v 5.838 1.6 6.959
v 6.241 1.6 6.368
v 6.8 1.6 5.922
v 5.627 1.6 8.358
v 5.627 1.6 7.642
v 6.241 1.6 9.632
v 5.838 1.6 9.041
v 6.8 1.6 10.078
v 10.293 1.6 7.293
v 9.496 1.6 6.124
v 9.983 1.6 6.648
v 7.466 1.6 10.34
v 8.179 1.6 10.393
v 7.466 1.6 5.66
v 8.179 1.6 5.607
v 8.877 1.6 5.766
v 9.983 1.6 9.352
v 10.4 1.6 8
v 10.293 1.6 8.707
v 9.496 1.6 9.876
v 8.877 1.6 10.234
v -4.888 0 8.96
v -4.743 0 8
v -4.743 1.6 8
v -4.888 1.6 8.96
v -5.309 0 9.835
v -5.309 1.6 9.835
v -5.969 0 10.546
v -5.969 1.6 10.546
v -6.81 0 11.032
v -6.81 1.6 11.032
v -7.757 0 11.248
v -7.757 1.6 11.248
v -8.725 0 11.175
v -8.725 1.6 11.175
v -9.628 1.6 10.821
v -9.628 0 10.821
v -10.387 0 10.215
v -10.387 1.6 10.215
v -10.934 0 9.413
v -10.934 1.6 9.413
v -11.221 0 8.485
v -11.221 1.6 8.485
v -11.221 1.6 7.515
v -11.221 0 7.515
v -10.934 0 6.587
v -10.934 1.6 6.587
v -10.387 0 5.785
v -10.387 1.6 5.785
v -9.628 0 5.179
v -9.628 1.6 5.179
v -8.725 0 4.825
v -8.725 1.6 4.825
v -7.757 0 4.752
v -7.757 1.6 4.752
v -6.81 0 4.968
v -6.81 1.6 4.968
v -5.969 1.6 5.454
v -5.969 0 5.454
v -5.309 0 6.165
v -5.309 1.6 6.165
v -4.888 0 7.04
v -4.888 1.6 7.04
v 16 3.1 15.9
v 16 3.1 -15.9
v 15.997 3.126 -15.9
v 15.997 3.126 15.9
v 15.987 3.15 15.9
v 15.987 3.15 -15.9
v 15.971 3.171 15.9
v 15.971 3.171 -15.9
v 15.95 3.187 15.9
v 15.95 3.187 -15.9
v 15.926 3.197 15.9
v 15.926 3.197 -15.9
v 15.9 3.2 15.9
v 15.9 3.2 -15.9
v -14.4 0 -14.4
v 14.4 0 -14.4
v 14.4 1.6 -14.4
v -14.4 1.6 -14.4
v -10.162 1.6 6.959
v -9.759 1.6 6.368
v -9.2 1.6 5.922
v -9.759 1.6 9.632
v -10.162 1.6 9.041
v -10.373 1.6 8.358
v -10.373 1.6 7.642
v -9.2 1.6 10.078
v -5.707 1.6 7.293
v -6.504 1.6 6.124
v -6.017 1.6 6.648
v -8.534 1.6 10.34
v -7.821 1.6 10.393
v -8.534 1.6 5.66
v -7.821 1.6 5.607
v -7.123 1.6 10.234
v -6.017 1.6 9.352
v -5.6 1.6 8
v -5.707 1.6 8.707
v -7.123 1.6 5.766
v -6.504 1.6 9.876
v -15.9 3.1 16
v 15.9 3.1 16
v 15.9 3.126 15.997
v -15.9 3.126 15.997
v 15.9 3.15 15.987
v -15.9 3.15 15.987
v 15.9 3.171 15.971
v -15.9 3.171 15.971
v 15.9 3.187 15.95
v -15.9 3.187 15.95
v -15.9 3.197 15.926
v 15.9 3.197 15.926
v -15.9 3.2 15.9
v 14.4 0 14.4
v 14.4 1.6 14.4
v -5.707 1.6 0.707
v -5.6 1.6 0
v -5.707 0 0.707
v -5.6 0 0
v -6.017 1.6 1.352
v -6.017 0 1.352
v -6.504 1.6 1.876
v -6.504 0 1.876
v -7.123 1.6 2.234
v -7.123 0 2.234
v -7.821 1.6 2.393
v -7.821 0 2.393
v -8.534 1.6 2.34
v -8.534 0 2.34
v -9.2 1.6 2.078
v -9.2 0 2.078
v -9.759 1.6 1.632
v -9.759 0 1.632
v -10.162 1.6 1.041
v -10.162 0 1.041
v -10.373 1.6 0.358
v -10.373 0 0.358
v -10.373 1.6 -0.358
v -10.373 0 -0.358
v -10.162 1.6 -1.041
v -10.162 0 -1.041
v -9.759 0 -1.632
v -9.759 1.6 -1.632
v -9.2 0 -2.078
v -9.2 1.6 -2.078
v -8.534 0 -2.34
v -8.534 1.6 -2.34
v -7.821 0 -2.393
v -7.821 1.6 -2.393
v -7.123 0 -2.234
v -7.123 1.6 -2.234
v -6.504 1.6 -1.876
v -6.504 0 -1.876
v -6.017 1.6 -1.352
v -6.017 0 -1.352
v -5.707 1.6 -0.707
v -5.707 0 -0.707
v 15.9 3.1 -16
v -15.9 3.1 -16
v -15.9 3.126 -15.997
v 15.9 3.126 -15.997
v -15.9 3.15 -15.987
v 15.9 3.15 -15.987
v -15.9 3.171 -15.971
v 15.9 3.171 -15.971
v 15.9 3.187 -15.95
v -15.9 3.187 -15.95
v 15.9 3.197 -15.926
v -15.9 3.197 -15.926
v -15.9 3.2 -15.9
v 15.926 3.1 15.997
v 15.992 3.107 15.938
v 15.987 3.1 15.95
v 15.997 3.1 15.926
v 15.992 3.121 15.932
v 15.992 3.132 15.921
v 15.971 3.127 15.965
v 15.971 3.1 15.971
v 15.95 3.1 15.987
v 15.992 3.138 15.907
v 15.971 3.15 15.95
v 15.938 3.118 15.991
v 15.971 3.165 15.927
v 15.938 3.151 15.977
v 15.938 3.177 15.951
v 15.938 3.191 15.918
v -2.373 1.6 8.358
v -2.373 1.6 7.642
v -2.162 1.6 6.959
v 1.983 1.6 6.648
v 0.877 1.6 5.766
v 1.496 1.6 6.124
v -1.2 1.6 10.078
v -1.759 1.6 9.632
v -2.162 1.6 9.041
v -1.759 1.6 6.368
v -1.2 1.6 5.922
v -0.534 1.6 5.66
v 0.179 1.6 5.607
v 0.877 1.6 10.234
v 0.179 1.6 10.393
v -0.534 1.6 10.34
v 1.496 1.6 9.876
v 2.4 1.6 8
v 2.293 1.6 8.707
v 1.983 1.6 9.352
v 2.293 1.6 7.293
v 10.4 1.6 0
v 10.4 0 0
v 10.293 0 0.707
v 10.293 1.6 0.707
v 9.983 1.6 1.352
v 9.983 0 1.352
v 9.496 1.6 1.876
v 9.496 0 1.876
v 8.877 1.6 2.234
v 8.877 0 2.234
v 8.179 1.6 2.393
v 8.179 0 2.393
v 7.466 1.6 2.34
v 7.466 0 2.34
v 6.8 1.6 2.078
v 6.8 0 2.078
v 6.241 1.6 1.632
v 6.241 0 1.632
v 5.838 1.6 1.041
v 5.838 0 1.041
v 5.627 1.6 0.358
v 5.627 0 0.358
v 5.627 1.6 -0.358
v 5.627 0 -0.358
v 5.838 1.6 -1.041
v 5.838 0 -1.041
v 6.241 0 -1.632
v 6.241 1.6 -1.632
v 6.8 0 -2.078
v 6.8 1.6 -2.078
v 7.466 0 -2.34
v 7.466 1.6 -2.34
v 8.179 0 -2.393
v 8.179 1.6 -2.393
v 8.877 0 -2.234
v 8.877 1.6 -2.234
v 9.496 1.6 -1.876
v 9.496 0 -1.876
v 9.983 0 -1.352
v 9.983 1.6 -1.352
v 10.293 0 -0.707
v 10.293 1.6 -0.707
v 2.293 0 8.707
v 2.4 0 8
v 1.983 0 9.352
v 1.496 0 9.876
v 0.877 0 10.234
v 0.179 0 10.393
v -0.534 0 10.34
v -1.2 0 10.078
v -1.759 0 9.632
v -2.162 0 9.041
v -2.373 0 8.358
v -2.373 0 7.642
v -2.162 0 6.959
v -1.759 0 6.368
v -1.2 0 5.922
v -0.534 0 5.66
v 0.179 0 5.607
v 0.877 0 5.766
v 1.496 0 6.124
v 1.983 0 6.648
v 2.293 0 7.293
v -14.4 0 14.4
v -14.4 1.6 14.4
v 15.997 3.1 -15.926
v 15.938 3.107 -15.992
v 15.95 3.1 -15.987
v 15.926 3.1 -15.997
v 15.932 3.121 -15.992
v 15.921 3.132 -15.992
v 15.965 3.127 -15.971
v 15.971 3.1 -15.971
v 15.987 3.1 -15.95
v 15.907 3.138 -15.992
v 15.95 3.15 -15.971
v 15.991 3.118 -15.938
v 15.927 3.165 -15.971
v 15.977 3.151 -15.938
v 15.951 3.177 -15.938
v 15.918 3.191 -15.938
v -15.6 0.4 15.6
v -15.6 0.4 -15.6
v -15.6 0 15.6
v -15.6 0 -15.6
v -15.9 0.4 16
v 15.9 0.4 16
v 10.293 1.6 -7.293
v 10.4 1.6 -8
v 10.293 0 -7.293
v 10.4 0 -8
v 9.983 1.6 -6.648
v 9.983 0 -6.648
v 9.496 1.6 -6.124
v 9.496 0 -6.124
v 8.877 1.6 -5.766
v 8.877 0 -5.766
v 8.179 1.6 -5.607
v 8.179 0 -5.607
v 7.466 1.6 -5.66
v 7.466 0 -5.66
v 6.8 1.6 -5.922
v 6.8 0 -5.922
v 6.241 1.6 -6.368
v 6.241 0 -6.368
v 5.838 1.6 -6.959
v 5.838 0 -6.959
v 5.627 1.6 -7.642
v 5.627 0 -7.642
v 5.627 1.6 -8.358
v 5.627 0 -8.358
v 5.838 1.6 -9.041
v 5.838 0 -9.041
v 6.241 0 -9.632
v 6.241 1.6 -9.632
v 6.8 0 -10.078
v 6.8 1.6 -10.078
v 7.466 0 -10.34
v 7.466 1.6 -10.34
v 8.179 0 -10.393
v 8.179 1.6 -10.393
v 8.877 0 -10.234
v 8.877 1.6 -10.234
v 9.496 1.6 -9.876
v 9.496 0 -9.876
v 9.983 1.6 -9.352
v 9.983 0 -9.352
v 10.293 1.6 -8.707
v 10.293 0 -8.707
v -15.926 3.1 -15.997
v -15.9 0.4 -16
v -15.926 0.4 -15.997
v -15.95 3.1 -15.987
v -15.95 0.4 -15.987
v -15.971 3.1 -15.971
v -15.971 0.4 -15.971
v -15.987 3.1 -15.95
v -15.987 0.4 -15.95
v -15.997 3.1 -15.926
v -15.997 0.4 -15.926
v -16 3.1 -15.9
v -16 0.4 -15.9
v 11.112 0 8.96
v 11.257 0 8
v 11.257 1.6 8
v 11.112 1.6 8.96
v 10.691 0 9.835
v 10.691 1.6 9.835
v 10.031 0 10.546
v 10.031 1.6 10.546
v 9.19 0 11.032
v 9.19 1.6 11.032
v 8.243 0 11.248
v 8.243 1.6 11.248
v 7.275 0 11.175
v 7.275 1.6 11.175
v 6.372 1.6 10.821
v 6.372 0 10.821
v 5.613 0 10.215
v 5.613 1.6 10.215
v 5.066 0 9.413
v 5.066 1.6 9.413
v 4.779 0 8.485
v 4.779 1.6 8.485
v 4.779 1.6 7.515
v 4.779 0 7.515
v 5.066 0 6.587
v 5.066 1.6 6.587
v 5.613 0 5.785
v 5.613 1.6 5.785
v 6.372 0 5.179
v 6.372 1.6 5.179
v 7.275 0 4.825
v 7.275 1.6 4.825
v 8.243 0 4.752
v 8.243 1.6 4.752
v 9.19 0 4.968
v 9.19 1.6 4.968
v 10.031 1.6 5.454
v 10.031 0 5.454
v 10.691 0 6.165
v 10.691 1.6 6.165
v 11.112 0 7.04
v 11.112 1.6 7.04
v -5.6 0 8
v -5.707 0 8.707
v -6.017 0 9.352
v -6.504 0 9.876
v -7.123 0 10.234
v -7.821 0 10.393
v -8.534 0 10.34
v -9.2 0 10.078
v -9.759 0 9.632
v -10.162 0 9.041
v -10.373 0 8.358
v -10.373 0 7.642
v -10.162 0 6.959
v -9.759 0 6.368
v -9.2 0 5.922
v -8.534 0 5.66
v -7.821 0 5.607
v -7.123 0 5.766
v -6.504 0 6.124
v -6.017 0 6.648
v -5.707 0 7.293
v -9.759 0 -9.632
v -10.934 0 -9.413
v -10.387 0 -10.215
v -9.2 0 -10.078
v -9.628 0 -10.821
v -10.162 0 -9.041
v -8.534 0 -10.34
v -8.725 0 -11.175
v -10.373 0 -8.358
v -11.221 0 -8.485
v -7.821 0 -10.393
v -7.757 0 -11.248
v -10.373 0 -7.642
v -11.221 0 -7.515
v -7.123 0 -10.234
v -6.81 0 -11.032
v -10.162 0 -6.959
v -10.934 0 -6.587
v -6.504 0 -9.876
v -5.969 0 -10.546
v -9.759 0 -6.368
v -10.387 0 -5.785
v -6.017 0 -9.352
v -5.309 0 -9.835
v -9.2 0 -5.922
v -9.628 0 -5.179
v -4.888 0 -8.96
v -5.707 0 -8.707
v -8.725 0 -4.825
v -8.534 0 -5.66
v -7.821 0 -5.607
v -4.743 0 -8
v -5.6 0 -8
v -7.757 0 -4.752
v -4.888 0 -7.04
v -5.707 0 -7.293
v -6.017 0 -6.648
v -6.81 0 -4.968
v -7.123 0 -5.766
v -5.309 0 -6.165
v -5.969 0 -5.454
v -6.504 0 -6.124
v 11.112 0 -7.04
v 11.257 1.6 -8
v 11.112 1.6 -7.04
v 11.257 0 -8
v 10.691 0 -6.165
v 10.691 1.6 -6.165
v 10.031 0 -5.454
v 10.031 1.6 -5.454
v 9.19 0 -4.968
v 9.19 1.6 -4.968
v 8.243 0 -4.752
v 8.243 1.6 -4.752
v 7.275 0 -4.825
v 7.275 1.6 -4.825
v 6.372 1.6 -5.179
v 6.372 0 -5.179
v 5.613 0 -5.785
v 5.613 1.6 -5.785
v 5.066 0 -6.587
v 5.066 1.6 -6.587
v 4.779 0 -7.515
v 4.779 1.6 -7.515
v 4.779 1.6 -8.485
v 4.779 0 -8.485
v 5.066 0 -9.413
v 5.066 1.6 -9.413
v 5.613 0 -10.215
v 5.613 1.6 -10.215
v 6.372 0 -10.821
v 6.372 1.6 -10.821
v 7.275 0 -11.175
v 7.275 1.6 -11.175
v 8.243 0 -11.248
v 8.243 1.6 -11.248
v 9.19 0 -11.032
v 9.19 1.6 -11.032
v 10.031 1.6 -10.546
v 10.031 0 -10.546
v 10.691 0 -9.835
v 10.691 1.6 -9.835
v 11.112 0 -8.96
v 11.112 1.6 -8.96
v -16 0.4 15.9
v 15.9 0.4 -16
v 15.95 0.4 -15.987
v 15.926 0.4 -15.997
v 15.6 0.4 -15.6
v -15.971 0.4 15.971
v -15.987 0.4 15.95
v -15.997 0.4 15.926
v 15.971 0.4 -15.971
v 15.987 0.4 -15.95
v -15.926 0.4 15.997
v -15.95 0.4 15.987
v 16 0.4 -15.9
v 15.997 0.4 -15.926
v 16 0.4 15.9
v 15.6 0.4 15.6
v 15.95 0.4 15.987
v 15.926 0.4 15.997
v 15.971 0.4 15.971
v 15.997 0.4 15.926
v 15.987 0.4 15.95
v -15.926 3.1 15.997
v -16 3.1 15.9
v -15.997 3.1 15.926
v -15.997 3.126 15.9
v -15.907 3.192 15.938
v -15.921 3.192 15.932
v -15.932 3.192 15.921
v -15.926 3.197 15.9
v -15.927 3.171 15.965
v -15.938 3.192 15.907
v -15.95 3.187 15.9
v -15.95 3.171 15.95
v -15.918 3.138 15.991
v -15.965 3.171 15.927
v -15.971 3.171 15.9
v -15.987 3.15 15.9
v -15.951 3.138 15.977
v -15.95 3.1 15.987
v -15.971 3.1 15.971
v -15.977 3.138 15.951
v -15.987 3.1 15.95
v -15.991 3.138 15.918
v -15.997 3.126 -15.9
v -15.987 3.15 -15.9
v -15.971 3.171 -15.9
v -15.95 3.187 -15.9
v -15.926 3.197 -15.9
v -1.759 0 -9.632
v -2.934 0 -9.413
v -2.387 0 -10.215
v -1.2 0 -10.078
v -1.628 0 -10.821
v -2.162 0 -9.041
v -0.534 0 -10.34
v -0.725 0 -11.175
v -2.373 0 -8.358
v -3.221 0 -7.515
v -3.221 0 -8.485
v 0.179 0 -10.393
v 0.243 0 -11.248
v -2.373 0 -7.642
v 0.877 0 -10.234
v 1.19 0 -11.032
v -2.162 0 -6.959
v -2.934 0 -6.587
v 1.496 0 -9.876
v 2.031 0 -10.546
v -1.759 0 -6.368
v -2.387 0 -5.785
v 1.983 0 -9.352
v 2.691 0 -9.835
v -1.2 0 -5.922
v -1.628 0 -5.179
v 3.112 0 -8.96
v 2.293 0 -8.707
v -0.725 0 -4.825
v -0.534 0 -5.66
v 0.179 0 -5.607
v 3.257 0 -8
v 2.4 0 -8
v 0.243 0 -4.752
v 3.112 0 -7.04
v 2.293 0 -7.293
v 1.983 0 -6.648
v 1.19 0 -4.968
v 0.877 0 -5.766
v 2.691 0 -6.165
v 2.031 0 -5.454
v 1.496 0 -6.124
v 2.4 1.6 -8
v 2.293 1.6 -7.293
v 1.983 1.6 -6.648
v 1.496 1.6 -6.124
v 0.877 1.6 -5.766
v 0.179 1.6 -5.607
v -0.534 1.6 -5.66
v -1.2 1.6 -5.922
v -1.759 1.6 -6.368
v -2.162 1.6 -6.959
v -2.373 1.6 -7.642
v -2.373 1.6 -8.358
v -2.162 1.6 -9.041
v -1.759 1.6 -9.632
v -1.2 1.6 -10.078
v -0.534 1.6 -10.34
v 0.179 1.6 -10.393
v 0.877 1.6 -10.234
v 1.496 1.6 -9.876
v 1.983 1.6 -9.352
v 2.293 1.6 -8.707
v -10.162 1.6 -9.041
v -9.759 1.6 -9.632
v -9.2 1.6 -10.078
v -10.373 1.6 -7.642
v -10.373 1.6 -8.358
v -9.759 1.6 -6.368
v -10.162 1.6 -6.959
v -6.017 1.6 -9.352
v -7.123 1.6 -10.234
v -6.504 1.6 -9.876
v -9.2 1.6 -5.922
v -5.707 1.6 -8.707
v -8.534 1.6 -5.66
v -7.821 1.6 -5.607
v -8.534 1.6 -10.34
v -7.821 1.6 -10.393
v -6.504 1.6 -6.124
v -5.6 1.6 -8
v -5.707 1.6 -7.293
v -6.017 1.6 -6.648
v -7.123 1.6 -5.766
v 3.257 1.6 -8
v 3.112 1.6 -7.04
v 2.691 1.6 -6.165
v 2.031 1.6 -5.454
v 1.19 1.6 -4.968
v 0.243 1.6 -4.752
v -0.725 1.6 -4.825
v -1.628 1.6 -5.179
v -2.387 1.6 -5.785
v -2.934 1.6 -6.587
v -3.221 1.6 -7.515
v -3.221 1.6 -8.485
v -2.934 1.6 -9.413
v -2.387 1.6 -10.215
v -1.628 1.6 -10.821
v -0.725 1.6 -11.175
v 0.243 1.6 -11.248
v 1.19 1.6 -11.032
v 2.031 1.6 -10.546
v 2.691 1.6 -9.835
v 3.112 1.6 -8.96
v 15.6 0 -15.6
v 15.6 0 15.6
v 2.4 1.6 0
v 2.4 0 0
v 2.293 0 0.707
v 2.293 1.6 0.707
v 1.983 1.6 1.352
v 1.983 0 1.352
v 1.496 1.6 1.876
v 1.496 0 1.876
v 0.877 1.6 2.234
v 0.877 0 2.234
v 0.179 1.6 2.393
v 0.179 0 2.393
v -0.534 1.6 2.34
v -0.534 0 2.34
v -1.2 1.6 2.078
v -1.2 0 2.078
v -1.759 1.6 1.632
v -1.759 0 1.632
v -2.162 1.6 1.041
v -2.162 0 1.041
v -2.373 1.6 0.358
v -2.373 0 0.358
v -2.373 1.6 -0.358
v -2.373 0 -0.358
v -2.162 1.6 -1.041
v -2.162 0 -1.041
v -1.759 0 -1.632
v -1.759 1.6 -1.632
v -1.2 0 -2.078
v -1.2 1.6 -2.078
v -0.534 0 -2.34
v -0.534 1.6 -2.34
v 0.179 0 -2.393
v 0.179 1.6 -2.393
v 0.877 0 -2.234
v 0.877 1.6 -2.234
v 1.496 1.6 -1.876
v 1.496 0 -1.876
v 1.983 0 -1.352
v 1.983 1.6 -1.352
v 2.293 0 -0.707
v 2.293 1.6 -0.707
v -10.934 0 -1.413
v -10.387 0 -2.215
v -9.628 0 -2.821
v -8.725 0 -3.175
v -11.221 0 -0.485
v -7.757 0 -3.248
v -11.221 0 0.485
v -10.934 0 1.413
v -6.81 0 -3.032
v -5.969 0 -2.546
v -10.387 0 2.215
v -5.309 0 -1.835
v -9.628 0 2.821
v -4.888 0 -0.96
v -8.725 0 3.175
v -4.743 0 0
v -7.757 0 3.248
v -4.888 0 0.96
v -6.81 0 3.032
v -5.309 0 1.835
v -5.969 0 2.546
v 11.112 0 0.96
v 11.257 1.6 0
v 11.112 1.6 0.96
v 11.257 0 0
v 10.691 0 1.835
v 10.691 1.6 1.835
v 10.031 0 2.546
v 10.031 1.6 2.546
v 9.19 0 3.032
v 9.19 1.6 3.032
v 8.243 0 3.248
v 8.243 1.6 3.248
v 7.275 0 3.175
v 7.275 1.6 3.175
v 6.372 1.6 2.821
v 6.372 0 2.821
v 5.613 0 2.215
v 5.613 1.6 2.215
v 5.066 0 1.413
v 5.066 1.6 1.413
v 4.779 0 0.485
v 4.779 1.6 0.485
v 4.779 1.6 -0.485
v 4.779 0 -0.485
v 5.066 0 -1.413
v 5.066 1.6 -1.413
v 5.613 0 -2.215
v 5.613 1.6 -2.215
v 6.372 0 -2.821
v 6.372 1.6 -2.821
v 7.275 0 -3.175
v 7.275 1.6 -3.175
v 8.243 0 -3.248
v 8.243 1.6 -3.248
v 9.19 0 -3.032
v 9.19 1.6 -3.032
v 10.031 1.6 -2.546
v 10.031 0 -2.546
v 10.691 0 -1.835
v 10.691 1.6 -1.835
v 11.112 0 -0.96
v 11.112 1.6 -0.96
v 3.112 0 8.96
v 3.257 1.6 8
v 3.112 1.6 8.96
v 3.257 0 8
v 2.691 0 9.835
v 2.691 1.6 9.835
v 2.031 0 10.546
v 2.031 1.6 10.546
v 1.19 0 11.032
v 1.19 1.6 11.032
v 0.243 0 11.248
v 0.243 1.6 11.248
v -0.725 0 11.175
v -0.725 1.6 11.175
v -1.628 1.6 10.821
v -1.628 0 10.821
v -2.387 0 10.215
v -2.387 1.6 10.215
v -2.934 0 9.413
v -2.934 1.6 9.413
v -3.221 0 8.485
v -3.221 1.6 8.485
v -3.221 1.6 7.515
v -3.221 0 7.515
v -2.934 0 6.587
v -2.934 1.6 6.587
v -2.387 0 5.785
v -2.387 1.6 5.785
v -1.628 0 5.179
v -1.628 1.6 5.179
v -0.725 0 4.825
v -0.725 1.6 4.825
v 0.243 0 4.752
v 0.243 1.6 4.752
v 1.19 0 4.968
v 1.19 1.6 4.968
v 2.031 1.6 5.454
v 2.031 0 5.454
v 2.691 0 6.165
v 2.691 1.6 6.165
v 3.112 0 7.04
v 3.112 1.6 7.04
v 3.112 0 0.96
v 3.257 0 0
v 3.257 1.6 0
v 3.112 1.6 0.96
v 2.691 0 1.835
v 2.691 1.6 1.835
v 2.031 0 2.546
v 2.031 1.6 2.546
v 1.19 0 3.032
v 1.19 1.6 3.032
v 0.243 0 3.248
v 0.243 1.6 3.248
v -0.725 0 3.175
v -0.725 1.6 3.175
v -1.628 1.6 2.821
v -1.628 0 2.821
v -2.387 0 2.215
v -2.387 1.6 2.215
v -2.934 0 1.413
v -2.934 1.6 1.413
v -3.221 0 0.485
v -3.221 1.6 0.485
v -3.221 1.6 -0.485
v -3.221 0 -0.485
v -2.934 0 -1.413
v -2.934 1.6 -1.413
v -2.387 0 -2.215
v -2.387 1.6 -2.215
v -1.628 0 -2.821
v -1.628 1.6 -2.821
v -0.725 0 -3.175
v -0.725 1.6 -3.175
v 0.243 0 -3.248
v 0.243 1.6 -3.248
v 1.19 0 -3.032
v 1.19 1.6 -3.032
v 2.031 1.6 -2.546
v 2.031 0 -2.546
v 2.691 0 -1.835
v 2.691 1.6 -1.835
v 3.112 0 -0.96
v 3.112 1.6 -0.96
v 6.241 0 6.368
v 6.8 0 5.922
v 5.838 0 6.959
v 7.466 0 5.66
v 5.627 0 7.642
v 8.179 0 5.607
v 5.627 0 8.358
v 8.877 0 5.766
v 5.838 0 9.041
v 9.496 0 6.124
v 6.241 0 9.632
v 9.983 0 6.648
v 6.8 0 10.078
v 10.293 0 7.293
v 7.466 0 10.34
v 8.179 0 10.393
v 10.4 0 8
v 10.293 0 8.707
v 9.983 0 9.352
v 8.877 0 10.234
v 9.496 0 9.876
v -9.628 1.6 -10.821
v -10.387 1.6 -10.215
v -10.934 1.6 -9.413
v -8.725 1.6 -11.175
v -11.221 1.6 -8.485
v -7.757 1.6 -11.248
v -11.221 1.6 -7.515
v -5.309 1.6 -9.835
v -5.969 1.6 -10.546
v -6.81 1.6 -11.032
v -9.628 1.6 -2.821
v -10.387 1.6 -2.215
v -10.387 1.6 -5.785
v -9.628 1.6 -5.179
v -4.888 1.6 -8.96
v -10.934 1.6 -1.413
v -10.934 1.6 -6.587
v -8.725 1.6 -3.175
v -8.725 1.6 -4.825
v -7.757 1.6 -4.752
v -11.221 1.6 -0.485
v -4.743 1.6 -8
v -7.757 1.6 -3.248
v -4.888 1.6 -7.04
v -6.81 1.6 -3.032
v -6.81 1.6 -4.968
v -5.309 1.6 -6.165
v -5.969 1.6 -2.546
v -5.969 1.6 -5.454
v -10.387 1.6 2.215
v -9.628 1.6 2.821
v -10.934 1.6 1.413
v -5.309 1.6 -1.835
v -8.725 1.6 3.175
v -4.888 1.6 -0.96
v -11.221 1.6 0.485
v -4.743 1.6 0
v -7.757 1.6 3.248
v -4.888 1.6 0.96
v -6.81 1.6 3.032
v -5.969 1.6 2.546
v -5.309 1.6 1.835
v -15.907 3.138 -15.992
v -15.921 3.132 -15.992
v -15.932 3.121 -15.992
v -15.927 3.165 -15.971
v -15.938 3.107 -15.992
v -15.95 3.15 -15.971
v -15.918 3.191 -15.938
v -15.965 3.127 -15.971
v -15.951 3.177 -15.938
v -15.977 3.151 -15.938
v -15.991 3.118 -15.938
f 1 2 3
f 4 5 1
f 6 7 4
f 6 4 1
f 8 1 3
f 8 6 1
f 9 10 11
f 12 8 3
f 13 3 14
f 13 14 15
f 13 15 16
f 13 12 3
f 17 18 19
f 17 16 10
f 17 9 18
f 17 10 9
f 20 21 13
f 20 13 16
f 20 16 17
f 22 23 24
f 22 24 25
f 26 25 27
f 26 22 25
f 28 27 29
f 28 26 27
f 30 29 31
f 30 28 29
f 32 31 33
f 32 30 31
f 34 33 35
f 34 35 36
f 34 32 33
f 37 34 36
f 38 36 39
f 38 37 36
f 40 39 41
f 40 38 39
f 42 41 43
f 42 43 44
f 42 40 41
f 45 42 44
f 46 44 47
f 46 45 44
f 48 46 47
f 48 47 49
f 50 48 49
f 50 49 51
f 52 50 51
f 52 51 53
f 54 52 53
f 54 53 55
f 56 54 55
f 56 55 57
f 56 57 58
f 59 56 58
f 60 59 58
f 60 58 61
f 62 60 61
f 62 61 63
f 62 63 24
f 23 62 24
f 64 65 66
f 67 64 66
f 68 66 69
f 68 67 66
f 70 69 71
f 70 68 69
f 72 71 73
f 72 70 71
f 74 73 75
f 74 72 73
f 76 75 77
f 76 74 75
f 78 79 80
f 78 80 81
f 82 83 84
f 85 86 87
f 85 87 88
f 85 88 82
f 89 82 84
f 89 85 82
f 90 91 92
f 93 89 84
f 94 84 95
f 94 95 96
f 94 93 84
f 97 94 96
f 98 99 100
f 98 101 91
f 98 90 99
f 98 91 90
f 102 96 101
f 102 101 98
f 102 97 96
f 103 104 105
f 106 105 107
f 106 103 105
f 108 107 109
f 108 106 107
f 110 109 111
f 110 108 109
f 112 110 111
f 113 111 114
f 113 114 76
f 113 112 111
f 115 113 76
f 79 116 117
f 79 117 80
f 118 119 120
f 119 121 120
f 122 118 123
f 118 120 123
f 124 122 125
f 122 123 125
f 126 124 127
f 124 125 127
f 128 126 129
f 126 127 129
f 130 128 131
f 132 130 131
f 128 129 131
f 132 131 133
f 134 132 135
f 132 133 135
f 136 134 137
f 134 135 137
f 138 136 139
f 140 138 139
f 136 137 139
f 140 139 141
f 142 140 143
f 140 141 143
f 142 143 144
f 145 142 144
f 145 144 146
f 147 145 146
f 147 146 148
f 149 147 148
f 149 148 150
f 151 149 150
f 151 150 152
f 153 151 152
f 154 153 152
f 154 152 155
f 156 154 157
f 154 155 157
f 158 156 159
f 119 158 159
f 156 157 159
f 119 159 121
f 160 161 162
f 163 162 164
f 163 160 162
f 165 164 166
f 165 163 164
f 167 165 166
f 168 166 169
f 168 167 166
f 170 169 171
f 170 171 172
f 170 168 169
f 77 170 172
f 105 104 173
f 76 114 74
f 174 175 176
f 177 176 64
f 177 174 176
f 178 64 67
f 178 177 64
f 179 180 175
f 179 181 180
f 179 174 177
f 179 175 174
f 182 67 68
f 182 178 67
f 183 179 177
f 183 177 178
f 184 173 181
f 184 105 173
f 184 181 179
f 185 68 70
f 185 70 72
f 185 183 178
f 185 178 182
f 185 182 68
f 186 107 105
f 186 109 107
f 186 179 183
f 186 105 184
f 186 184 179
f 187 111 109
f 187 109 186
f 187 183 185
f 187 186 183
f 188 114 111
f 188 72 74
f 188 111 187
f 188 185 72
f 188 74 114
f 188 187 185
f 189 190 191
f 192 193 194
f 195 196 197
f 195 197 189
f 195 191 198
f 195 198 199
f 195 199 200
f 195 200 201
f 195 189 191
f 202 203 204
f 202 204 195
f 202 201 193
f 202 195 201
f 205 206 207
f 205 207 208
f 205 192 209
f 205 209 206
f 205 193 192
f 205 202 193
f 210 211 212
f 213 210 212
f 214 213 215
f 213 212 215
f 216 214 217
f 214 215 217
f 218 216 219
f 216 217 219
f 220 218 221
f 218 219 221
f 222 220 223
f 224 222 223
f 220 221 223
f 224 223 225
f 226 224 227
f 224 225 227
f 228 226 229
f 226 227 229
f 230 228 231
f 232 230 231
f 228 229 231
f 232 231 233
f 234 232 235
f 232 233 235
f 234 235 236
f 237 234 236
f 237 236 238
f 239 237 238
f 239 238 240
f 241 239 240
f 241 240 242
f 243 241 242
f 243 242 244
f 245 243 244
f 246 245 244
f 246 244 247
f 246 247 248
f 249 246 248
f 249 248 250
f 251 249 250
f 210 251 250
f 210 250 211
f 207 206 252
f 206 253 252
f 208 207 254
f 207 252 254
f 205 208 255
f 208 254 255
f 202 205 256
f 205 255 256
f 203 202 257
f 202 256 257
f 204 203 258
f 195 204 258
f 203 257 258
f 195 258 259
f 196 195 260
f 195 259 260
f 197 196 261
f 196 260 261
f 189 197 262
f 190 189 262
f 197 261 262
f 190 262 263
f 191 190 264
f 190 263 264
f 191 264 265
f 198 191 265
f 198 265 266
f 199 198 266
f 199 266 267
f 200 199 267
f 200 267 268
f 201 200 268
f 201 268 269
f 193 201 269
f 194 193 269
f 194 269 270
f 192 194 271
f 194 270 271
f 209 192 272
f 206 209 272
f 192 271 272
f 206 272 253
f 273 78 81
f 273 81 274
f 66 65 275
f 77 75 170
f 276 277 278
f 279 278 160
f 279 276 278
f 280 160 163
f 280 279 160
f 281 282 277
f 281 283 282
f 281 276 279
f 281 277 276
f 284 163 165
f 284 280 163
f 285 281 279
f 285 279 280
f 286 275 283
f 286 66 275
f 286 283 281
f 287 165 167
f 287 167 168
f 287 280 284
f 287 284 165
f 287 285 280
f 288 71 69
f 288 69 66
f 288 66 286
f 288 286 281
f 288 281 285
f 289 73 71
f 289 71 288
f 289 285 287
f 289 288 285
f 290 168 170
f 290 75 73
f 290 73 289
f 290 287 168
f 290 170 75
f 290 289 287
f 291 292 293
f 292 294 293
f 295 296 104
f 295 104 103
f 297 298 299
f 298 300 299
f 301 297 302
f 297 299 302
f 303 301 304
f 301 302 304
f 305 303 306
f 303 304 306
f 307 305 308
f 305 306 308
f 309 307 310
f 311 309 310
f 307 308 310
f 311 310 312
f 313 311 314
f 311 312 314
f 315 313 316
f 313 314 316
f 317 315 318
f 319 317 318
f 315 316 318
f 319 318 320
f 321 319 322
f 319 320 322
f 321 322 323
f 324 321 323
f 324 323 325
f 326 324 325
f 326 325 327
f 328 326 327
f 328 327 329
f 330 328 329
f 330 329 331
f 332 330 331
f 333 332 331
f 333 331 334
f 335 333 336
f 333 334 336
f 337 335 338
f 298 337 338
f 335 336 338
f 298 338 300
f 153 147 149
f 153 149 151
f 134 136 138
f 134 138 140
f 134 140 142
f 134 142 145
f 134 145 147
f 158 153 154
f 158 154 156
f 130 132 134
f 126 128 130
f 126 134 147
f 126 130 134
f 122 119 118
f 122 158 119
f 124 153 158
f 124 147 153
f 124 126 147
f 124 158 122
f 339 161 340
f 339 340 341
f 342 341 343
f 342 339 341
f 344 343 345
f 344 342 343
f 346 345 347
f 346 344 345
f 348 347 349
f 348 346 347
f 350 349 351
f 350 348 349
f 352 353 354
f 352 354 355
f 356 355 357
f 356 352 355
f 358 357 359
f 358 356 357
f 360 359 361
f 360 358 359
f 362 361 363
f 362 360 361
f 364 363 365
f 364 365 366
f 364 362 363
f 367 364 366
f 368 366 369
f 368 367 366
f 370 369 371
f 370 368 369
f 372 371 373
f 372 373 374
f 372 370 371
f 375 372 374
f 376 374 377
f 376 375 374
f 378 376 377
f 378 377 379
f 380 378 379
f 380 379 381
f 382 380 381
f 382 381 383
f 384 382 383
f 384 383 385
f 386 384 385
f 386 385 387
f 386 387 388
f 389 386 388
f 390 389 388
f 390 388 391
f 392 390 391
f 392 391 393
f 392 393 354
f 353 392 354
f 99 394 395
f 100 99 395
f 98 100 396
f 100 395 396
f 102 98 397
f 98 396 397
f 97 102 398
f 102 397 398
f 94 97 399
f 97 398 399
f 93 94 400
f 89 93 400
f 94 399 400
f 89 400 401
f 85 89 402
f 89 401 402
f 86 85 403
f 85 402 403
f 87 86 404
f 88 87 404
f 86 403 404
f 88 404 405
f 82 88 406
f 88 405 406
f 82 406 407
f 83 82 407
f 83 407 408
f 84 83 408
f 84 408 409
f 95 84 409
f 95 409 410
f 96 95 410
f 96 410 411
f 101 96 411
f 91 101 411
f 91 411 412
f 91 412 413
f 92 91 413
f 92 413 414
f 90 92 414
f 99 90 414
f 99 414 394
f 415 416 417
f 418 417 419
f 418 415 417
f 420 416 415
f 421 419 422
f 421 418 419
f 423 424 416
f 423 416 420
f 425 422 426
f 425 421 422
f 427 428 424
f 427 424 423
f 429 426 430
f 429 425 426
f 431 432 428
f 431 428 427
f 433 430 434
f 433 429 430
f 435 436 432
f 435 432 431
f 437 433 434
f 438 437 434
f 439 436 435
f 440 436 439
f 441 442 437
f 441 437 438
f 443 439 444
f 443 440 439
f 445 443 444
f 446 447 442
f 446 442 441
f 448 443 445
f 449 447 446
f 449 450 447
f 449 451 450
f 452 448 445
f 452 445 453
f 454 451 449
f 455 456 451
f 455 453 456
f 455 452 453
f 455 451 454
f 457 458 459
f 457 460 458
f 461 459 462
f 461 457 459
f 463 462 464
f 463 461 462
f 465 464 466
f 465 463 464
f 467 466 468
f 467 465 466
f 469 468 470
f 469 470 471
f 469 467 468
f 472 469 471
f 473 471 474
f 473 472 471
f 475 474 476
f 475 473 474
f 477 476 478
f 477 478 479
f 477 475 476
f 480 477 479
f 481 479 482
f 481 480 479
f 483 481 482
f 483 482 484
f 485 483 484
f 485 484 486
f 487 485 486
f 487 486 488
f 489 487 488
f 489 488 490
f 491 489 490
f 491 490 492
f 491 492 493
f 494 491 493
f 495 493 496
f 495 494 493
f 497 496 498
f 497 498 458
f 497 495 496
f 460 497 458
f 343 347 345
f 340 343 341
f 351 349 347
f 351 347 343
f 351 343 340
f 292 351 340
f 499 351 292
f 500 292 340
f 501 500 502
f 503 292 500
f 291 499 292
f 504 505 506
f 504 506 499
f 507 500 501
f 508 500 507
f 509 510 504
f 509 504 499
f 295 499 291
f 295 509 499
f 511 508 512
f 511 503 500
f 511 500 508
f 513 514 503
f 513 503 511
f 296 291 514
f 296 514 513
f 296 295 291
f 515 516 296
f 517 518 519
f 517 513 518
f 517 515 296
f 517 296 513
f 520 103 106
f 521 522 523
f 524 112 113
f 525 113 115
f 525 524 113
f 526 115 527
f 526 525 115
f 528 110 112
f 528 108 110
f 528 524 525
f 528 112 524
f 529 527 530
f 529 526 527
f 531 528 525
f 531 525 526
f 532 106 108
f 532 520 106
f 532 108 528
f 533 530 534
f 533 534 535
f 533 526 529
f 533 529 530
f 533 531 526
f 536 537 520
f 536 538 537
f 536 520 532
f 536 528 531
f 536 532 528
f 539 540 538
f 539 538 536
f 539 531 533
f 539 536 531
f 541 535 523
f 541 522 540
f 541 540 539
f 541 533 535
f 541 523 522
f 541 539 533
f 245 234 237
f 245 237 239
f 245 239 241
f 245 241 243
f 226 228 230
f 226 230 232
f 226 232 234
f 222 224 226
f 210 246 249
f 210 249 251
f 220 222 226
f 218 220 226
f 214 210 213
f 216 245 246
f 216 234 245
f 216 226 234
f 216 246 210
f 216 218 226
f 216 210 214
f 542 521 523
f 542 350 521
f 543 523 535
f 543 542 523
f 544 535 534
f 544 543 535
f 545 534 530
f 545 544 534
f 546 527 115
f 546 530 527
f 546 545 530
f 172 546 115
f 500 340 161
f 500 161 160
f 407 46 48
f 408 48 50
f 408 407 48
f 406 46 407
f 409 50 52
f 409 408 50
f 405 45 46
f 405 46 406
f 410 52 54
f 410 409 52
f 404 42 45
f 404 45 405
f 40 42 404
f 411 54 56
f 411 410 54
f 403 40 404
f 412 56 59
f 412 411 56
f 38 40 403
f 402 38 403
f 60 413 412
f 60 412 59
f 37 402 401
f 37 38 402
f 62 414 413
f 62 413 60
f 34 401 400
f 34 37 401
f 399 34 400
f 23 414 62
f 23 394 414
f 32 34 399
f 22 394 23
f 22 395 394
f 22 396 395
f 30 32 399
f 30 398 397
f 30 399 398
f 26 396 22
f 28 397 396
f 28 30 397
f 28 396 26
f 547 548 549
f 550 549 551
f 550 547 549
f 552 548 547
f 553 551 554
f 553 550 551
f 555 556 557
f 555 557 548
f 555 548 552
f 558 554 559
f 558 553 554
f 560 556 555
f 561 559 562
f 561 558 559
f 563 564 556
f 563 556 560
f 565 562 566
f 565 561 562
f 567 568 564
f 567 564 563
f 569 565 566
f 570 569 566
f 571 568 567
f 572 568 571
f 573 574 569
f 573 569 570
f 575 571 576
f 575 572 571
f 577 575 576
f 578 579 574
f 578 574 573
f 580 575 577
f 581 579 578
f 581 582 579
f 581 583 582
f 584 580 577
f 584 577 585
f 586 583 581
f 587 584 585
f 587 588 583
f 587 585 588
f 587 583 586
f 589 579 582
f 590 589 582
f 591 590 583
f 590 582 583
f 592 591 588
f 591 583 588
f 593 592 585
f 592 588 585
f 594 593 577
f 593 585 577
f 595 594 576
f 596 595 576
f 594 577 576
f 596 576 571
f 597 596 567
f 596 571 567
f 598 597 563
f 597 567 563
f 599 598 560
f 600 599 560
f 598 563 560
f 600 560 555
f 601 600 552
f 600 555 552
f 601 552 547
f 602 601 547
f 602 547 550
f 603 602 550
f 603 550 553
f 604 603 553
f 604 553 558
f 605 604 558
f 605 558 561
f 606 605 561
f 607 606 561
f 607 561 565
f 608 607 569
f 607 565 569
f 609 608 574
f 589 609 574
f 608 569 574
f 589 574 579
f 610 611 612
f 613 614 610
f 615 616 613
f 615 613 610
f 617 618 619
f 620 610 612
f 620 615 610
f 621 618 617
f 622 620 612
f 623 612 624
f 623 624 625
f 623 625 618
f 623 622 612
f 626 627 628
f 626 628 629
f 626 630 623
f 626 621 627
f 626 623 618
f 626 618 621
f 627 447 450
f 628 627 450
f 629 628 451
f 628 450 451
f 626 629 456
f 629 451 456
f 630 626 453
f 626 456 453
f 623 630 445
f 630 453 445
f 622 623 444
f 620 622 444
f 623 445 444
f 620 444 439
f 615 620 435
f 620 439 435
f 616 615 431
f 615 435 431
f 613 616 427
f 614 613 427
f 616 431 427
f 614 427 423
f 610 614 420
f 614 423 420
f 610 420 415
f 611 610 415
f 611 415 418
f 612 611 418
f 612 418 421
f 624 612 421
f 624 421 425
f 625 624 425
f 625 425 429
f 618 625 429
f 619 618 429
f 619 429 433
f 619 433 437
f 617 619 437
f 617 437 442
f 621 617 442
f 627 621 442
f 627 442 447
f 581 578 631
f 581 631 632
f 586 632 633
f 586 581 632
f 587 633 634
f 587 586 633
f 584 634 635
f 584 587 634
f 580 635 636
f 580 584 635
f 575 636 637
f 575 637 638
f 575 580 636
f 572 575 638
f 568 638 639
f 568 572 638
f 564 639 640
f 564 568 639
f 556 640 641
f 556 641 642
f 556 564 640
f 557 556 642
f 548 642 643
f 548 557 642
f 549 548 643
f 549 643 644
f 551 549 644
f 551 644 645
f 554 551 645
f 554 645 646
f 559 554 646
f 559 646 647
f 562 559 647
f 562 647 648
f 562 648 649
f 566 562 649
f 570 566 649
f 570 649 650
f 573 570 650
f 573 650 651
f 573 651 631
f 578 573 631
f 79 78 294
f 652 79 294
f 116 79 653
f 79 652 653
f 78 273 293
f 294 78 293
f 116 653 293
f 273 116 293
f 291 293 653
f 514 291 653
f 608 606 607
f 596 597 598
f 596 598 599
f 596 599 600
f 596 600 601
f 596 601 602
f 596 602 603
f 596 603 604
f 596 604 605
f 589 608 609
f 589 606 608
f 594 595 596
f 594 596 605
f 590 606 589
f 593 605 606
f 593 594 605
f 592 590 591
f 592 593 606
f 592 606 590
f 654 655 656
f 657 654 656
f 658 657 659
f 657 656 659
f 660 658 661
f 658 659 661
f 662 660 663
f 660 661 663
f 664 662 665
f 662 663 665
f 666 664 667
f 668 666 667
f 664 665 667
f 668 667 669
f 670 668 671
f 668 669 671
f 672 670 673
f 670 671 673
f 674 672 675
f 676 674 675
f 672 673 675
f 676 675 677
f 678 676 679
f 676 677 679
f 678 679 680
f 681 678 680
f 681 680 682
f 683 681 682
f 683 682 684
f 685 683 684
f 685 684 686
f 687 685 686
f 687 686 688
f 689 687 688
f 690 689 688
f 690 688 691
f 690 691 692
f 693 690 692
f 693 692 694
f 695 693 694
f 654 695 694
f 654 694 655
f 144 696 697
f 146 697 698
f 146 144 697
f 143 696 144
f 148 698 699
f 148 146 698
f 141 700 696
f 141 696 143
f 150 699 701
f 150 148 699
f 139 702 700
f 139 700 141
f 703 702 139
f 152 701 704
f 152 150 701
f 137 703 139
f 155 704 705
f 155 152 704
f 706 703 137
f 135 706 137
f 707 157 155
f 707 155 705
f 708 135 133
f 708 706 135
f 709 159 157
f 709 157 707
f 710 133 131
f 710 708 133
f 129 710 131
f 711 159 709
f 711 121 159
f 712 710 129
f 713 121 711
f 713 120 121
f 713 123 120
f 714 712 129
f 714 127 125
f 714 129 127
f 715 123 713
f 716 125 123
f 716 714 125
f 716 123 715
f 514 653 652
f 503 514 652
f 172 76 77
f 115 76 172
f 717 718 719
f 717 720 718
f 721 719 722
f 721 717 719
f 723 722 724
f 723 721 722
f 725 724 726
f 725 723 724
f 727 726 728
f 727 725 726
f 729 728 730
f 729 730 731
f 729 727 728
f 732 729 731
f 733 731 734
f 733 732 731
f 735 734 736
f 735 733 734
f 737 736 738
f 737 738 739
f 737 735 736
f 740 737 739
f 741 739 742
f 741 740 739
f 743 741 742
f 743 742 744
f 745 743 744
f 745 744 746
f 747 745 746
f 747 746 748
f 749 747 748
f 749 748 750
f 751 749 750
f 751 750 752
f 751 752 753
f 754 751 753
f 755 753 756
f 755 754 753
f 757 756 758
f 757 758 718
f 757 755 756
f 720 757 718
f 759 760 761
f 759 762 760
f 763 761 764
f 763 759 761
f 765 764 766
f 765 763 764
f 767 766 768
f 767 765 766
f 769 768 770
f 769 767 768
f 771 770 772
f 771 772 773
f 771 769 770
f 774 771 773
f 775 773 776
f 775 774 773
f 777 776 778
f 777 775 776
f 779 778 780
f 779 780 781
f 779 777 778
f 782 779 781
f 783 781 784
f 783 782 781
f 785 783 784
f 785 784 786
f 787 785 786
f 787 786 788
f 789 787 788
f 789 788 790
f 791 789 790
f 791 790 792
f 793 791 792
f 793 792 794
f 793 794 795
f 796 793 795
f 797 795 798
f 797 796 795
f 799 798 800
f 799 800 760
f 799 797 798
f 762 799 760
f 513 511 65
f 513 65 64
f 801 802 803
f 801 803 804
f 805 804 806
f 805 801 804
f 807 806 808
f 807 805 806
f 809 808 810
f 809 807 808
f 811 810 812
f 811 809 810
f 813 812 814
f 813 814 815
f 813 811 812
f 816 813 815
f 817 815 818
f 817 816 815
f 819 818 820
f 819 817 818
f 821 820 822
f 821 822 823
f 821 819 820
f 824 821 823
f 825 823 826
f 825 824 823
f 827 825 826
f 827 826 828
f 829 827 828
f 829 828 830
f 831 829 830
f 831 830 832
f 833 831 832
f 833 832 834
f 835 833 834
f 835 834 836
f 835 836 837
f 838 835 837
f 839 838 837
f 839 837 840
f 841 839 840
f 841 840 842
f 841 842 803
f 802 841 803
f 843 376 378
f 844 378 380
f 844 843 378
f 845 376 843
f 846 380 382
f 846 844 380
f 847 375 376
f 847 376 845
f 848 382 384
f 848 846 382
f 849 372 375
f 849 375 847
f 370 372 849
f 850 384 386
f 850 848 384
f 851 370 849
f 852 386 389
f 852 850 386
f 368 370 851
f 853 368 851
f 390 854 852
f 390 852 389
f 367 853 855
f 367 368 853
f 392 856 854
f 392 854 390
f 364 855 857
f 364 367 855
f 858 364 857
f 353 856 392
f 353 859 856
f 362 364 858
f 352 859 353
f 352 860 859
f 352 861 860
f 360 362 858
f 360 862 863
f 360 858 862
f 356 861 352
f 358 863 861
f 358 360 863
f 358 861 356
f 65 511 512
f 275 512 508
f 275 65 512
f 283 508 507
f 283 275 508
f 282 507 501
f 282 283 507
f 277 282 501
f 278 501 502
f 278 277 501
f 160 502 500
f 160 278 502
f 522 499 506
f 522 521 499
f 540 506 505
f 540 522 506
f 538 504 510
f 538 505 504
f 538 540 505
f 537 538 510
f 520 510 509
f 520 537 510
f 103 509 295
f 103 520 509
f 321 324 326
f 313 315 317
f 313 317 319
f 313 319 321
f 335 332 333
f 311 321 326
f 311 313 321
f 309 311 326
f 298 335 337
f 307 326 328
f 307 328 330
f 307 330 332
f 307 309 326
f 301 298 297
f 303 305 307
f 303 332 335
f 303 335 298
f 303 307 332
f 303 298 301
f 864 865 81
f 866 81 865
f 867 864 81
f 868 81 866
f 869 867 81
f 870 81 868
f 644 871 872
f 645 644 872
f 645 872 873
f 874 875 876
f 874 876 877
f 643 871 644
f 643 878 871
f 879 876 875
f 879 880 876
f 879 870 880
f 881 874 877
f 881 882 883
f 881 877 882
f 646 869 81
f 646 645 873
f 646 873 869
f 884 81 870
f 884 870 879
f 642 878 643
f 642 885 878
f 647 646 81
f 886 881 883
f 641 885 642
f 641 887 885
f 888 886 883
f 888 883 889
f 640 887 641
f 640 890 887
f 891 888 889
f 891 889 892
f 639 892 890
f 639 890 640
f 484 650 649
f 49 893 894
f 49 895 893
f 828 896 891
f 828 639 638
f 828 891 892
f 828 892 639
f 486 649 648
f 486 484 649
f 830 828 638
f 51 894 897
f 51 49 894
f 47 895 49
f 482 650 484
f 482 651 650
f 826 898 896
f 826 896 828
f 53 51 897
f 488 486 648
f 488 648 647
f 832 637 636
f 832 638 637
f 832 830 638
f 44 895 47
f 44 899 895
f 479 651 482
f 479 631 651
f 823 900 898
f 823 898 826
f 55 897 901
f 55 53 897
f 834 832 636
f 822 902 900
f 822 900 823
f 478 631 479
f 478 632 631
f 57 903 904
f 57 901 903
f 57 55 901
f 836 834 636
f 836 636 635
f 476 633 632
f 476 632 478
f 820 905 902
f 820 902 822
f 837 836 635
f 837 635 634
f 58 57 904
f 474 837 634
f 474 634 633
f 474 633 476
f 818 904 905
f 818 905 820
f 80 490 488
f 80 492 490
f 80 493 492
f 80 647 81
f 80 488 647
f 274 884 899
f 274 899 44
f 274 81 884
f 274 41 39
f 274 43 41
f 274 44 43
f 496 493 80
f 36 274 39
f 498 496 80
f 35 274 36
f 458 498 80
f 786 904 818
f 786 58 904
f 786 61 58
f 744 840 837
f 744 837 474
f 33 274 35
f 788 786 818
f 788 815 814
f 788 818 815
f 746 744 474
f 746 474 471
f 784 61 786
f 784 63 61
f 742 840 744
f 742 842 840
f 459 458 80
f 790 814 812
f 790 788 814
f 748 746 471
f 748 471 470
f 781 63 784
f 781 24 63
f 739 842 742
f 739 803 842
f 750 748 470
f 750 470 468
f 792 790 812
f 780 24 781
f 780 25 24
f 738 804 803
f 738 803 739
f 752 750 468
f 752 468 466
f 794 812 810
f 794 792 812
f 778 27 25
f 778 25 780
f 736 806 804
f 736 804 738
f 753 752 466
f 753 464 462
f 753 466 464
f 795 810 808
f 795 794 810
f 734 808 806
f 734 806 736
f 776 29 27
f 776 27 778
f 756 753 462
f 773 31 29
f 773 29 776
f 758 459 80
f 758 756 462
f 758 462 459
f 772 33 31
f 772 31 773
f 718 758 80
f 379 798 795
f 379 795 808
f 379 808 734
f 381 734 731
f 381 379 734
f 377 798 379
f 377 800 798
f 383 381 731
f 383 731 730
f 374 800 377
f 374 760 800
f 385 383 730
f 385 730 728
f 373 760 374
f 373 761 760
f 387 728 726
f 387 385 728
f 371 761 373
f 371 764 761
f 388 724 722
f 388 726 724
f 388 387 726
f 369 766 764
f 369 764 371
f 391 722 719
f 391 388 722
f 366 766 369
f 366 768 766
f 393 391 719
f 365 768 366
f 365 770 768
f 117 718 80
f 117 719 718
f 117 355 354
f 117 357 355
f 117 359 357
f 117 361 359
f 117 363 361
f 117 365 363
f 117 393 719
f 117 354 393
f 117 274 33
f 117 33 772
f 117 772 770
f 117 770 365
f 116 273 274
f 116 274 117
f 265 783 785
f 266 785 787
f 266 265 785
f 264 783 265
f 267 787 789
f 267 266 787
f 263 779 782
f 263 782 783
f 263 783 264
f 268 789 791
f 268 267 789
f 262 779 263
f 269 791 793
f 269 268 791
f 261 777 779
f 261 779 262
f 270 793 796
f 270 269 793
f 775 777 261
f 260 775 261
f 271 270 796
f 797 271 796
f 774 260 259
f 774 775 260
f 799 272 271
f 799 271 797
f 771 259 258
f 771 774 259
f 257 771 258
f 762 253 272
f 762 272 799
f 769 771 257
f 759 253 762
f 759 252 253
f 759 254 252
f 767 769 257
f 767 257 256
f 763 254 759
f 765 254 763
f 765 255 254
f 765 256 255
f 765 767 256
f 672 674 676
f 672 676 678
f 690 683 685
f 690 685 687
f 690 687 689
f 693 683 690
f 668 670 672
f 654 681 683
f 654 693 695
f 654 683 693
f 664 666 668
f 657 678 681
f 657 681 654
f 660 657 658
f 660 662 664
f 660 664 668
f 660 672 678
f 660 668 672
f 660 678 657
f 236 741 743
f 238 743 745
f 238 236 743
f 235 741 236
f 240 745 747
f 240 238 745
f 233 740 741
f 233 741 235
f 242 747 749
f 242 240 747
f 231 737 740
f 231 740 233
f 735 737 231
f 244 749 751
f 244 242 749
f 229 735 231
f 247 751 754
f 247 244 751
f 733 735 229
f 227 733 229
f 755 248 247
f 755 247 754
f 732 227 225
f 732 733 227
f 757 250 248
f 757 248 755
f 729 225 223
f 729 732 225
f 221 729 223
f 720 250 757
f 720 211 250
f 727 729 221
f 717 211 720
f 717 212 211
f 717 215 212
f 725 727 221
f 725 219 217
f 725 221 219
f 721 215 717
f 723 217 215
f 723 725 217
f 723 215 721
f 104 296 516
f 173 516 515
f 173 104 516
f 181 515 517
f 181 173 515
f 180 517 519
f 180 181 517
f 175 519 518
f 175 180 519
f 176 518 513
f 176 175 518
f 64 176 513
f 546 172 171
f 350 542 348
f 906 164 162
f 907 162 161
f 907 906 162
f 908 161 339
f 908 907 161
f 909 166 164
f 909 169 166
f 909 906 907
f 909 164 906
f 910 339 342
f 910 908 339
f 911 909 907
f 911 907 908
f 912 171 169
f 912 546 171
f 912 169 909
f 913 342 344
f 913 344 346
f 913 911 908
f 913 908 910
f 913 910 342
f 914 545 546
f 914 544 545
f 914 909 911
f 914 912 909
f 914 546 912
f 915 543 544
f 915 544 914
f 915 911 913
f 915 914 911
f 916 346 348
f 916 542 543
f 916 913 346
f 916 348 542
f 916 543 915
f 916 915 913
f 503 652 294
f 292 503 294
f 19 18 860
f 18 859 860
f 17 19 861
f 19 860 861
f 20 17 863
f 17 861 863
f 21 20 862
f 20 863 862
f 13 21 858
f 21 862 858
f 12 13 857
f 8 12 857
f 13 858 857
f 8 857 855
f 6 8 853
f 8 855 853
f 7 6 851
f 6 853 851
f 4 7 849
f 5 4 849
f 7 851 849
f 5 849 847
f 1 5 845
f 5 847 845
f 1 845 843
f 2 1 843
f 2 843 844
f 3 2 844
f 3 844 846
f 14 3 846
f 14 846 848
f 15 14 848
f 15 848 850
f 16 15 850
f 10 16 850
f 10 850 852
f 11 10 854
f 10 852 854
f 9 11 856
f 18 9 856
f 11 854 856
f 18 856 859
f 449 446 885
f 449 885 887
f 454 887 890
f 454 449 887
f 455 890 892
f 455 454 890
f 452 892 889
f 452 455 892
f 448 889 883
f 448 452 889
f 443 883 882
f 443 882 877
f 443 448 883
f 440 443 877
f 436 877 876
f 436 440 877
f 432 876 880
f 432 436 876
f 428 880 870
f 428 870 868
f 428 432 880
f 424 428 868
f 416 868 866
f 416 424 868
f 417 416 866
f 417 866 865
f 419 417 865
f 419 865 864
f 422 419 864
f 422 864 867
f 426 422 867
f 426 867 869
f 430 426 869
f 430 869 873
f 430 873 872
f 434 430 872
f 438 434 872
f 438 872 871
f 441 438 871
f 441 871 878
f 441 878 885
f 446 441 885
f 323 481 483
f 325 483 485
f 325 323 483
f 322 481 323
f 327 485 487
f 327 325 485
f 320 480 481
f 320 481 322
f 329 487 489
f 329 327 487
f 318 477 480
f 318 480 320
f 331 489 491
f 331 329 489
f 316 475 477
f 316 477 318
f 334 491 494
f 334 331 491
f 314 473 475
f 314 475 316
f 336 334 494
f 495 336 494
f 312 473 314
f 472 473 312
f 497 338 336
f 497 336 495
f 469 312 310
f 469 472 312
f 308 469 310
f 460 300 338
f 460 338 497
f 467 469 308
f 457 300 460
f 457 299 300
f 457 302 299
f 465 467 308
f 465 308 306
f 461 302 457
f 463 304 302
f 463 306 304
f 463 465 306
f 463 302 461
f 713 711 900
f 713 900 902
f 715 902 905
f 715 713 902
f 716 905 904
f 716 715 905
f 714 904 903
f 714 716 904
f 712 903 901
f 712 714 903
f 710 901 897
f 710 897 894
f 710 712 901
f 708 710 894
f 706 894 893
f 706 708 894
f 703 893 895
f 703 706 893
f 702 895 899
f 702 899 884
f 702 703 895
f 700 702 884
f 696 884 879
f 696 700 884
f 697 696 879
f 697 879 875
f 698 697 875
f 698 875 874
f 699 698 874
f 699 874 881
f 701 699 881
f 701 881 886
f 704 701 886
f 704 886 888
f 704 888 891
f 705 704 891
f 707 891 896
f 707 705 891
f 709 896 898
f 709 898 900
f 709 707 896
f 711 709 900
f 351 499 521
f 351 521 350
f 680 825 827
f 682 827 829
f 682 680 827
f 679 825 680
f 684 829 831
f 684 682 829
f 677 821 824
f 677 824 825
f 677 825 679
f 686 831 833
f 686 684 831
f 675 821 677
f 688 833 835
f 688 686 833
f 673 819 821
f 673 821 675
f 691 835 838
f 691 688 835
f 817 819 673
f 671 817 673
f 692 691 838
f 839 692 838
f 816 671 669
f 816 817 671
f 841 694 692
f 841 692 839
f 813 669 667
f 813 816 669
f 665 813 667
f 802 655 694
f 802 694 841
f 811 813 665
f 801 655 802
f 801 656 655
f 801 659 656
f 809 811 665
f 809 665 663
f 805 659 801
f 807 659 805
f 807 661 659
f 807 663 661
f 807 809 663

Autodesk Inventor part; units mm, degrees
ref_plane "YZ Plane" through (0, 0, 0) normal (1, 0, 0) x (0, 1, 0)
ref_plane "XZ Plane" through (0, 0, 0) normal (0, 1, 0) x (-1, 0, 0)
ref_plane "XY Plane" through (0, 0, 0) normal (0, 0, 1) x (1, 0, 0)
sketch "Sketch2" plane through (0, 0, 0) normal (0, 1, 0) x (-1, 0, 0)
  line L0 (-16, 16) -> (16, 16)
  line L1 (16, 16) -> (16, -16)
  line L2 (16, -16) -> (-16, -16)
  line L3 (-16, -16) -> (-16, 16)
  point P0 (0, 0)
  point P1 (0, 16)
  point P2 (-16, 0)
  dimension "d0" = 32
  dimension "d1" = 32
extrude "Extrusion1" add sketch "Sketch2" along normal blind 3.2
sketch "Sketch3" plane through (0, 0, 0) normal (0, -1, 0) x (1, 0, 0)
  line L0 (-16, 16) -> (-16, -16) projected
  line L1 (-14.4, 14.4) -> (14.4, 14.4)
  line L2 (14.4, 14.4) -> (14.4, -14.4)
  line L3 (14.4, -14.4) -> (-14.4, -14.4)
  line L4 (-14.4, -14.4) -> (-14.4, 14.4)
  circle A0 centre (-8, 0) radius 3.2569
  circle A1 centre (-8, 0) radius 2.4
  line L5 (-16, -16) -> (16, -16) projected
  circle A2 centre (0, 0) radius 1.6
  line L6 (16, -16) -> (16, 16) projected
  line L7 (-12, 0) -> (-4, 0) construction
  line L8 (-4, 0) -> (4, 0) construction
  line L9 (4, 0) -> (12, 0) construction
  circle A3 centre (-12, 12) radius 2.4 construction
  circle A4 centre (-12, -12) radius 2.4 construction
  circle A5 centre (12, -12) radius 2.4 construction
  circle A6 centre (12, 12) radius 2.4 construction
  line L10 (16, 16) -> (-16, 16) projected
  line L11 (-15.6, 15.6) -> (15.6, 15.6)
  line L12 (15.6, 15.6) -> (15.6, -15.6)
  line L13 (15.6, -15.6) -> (-15.6, -15.6)
  line L14 (-15.6, -15.6) -> (-15.6, 15.6)
  circle A7 centre (-12, 4) radius 2.4 construction
  point P0 (-14.4, 0)
  point P1 (0, 14.4)
  point P2 (0, 0)
  point P3 (0, 15.6)
  point P4 (-15.6, 0)
  dimension "d61" = 4.8
  dimension "d75" = 8
  dimension "d76" = 16
  dimension "d86" = 3.2
  dimension "d92" = 8
  dimension "d98" = 24
  dimension "d99" = 24
  dimension "d102" = 0.4
  dimension "d103" = 0.4
  dimension "d106" = 8
extrude "Extrusion2" cut sketch "Sketch3" against normal blind 1.6 contours L1 L2 L3 L4 | A0 | A1 | A2
extrude "Extrusion7" cut sketch "Sketch3" against normal blind 0.4 contours L10 L6 L5 L0
extrude "Extrusion6" add sketch "Sketch3" against normal up to next contours A0
pattern_linear "Rectangular Pattern3" count 3 spacing 8 along (1, 0, 0) count 3 spacing 8 along (0, 0, -1) of "Extrusion6" second direction both ways yes
fillet "Fillet1" radius 0.1 8 edges at (-16, 1.8, 16) (0, 3.2, 16) (-16, 3.2, 0) (16, 1.8, 16) (16, 3.2, 0) (0, 3.2, -16) (16, 1.8, -16) (-16, 1.8, -16)
sketch "Skizze10" plane through (0, 3.2, 0) normal (0, 1, 0) x (1, 0, 0)
  line L0 (-15.9, 15.9) -> (15.9, 15.9) projected
  line L1 (-16.3705, 16.4) -> (16.3705, 16.4) construction
  line L2 (16.3705, 16.4) -> (16.3705, -16.4) construction
  line L3 (16.3705, -16.4) -> (-16.3705, -16.4) construction
  line L4 (-16.3705, -16.4) -> (-16.3705, 16.4) construction
  point P0 (0, 0)
  point P1 (0, 16.4)
  point P2 (-16.3705, 0)
  dimension "d123" = 0.5
decal "Aufkleber1"
equation "\"d4\" = 0.333333 * lh"
equation "\"d61\" = kd"
equation "\"d75\" = lu"
equation "\"d76\" = 2 * d75"
equation "\"d86\" = pd"
equation "\"d92\" = lu"
equation "\"d98\" = d99"
equation "\"d99\" = 3 * d75"
equation "\"d102\" = gw"
equation "\"d103\" = gw"
equation "\"d106\" = lu"
equation "\"d11\" = 0.333333 * lh - topthk"
equation "\"d104\" = gh"
equation "\"d91\" = lu"
equation "\"d109\" = lu"
equation "\"d22\" = lf"
equation "\"lh\" = 9.6"
equation "\"kd\" = 4.8"
equation "\"lu\" = 8"
equation "\"pd\" = 3.2"
equation "\"gw\" = 0.4"
equation "\"topthk\" = 1.6"
equation "\"gh\" = 0.4"
equation "\"lf\" = 0.1"
properties part number "42146_1751_1" material "ABS Plastic"
